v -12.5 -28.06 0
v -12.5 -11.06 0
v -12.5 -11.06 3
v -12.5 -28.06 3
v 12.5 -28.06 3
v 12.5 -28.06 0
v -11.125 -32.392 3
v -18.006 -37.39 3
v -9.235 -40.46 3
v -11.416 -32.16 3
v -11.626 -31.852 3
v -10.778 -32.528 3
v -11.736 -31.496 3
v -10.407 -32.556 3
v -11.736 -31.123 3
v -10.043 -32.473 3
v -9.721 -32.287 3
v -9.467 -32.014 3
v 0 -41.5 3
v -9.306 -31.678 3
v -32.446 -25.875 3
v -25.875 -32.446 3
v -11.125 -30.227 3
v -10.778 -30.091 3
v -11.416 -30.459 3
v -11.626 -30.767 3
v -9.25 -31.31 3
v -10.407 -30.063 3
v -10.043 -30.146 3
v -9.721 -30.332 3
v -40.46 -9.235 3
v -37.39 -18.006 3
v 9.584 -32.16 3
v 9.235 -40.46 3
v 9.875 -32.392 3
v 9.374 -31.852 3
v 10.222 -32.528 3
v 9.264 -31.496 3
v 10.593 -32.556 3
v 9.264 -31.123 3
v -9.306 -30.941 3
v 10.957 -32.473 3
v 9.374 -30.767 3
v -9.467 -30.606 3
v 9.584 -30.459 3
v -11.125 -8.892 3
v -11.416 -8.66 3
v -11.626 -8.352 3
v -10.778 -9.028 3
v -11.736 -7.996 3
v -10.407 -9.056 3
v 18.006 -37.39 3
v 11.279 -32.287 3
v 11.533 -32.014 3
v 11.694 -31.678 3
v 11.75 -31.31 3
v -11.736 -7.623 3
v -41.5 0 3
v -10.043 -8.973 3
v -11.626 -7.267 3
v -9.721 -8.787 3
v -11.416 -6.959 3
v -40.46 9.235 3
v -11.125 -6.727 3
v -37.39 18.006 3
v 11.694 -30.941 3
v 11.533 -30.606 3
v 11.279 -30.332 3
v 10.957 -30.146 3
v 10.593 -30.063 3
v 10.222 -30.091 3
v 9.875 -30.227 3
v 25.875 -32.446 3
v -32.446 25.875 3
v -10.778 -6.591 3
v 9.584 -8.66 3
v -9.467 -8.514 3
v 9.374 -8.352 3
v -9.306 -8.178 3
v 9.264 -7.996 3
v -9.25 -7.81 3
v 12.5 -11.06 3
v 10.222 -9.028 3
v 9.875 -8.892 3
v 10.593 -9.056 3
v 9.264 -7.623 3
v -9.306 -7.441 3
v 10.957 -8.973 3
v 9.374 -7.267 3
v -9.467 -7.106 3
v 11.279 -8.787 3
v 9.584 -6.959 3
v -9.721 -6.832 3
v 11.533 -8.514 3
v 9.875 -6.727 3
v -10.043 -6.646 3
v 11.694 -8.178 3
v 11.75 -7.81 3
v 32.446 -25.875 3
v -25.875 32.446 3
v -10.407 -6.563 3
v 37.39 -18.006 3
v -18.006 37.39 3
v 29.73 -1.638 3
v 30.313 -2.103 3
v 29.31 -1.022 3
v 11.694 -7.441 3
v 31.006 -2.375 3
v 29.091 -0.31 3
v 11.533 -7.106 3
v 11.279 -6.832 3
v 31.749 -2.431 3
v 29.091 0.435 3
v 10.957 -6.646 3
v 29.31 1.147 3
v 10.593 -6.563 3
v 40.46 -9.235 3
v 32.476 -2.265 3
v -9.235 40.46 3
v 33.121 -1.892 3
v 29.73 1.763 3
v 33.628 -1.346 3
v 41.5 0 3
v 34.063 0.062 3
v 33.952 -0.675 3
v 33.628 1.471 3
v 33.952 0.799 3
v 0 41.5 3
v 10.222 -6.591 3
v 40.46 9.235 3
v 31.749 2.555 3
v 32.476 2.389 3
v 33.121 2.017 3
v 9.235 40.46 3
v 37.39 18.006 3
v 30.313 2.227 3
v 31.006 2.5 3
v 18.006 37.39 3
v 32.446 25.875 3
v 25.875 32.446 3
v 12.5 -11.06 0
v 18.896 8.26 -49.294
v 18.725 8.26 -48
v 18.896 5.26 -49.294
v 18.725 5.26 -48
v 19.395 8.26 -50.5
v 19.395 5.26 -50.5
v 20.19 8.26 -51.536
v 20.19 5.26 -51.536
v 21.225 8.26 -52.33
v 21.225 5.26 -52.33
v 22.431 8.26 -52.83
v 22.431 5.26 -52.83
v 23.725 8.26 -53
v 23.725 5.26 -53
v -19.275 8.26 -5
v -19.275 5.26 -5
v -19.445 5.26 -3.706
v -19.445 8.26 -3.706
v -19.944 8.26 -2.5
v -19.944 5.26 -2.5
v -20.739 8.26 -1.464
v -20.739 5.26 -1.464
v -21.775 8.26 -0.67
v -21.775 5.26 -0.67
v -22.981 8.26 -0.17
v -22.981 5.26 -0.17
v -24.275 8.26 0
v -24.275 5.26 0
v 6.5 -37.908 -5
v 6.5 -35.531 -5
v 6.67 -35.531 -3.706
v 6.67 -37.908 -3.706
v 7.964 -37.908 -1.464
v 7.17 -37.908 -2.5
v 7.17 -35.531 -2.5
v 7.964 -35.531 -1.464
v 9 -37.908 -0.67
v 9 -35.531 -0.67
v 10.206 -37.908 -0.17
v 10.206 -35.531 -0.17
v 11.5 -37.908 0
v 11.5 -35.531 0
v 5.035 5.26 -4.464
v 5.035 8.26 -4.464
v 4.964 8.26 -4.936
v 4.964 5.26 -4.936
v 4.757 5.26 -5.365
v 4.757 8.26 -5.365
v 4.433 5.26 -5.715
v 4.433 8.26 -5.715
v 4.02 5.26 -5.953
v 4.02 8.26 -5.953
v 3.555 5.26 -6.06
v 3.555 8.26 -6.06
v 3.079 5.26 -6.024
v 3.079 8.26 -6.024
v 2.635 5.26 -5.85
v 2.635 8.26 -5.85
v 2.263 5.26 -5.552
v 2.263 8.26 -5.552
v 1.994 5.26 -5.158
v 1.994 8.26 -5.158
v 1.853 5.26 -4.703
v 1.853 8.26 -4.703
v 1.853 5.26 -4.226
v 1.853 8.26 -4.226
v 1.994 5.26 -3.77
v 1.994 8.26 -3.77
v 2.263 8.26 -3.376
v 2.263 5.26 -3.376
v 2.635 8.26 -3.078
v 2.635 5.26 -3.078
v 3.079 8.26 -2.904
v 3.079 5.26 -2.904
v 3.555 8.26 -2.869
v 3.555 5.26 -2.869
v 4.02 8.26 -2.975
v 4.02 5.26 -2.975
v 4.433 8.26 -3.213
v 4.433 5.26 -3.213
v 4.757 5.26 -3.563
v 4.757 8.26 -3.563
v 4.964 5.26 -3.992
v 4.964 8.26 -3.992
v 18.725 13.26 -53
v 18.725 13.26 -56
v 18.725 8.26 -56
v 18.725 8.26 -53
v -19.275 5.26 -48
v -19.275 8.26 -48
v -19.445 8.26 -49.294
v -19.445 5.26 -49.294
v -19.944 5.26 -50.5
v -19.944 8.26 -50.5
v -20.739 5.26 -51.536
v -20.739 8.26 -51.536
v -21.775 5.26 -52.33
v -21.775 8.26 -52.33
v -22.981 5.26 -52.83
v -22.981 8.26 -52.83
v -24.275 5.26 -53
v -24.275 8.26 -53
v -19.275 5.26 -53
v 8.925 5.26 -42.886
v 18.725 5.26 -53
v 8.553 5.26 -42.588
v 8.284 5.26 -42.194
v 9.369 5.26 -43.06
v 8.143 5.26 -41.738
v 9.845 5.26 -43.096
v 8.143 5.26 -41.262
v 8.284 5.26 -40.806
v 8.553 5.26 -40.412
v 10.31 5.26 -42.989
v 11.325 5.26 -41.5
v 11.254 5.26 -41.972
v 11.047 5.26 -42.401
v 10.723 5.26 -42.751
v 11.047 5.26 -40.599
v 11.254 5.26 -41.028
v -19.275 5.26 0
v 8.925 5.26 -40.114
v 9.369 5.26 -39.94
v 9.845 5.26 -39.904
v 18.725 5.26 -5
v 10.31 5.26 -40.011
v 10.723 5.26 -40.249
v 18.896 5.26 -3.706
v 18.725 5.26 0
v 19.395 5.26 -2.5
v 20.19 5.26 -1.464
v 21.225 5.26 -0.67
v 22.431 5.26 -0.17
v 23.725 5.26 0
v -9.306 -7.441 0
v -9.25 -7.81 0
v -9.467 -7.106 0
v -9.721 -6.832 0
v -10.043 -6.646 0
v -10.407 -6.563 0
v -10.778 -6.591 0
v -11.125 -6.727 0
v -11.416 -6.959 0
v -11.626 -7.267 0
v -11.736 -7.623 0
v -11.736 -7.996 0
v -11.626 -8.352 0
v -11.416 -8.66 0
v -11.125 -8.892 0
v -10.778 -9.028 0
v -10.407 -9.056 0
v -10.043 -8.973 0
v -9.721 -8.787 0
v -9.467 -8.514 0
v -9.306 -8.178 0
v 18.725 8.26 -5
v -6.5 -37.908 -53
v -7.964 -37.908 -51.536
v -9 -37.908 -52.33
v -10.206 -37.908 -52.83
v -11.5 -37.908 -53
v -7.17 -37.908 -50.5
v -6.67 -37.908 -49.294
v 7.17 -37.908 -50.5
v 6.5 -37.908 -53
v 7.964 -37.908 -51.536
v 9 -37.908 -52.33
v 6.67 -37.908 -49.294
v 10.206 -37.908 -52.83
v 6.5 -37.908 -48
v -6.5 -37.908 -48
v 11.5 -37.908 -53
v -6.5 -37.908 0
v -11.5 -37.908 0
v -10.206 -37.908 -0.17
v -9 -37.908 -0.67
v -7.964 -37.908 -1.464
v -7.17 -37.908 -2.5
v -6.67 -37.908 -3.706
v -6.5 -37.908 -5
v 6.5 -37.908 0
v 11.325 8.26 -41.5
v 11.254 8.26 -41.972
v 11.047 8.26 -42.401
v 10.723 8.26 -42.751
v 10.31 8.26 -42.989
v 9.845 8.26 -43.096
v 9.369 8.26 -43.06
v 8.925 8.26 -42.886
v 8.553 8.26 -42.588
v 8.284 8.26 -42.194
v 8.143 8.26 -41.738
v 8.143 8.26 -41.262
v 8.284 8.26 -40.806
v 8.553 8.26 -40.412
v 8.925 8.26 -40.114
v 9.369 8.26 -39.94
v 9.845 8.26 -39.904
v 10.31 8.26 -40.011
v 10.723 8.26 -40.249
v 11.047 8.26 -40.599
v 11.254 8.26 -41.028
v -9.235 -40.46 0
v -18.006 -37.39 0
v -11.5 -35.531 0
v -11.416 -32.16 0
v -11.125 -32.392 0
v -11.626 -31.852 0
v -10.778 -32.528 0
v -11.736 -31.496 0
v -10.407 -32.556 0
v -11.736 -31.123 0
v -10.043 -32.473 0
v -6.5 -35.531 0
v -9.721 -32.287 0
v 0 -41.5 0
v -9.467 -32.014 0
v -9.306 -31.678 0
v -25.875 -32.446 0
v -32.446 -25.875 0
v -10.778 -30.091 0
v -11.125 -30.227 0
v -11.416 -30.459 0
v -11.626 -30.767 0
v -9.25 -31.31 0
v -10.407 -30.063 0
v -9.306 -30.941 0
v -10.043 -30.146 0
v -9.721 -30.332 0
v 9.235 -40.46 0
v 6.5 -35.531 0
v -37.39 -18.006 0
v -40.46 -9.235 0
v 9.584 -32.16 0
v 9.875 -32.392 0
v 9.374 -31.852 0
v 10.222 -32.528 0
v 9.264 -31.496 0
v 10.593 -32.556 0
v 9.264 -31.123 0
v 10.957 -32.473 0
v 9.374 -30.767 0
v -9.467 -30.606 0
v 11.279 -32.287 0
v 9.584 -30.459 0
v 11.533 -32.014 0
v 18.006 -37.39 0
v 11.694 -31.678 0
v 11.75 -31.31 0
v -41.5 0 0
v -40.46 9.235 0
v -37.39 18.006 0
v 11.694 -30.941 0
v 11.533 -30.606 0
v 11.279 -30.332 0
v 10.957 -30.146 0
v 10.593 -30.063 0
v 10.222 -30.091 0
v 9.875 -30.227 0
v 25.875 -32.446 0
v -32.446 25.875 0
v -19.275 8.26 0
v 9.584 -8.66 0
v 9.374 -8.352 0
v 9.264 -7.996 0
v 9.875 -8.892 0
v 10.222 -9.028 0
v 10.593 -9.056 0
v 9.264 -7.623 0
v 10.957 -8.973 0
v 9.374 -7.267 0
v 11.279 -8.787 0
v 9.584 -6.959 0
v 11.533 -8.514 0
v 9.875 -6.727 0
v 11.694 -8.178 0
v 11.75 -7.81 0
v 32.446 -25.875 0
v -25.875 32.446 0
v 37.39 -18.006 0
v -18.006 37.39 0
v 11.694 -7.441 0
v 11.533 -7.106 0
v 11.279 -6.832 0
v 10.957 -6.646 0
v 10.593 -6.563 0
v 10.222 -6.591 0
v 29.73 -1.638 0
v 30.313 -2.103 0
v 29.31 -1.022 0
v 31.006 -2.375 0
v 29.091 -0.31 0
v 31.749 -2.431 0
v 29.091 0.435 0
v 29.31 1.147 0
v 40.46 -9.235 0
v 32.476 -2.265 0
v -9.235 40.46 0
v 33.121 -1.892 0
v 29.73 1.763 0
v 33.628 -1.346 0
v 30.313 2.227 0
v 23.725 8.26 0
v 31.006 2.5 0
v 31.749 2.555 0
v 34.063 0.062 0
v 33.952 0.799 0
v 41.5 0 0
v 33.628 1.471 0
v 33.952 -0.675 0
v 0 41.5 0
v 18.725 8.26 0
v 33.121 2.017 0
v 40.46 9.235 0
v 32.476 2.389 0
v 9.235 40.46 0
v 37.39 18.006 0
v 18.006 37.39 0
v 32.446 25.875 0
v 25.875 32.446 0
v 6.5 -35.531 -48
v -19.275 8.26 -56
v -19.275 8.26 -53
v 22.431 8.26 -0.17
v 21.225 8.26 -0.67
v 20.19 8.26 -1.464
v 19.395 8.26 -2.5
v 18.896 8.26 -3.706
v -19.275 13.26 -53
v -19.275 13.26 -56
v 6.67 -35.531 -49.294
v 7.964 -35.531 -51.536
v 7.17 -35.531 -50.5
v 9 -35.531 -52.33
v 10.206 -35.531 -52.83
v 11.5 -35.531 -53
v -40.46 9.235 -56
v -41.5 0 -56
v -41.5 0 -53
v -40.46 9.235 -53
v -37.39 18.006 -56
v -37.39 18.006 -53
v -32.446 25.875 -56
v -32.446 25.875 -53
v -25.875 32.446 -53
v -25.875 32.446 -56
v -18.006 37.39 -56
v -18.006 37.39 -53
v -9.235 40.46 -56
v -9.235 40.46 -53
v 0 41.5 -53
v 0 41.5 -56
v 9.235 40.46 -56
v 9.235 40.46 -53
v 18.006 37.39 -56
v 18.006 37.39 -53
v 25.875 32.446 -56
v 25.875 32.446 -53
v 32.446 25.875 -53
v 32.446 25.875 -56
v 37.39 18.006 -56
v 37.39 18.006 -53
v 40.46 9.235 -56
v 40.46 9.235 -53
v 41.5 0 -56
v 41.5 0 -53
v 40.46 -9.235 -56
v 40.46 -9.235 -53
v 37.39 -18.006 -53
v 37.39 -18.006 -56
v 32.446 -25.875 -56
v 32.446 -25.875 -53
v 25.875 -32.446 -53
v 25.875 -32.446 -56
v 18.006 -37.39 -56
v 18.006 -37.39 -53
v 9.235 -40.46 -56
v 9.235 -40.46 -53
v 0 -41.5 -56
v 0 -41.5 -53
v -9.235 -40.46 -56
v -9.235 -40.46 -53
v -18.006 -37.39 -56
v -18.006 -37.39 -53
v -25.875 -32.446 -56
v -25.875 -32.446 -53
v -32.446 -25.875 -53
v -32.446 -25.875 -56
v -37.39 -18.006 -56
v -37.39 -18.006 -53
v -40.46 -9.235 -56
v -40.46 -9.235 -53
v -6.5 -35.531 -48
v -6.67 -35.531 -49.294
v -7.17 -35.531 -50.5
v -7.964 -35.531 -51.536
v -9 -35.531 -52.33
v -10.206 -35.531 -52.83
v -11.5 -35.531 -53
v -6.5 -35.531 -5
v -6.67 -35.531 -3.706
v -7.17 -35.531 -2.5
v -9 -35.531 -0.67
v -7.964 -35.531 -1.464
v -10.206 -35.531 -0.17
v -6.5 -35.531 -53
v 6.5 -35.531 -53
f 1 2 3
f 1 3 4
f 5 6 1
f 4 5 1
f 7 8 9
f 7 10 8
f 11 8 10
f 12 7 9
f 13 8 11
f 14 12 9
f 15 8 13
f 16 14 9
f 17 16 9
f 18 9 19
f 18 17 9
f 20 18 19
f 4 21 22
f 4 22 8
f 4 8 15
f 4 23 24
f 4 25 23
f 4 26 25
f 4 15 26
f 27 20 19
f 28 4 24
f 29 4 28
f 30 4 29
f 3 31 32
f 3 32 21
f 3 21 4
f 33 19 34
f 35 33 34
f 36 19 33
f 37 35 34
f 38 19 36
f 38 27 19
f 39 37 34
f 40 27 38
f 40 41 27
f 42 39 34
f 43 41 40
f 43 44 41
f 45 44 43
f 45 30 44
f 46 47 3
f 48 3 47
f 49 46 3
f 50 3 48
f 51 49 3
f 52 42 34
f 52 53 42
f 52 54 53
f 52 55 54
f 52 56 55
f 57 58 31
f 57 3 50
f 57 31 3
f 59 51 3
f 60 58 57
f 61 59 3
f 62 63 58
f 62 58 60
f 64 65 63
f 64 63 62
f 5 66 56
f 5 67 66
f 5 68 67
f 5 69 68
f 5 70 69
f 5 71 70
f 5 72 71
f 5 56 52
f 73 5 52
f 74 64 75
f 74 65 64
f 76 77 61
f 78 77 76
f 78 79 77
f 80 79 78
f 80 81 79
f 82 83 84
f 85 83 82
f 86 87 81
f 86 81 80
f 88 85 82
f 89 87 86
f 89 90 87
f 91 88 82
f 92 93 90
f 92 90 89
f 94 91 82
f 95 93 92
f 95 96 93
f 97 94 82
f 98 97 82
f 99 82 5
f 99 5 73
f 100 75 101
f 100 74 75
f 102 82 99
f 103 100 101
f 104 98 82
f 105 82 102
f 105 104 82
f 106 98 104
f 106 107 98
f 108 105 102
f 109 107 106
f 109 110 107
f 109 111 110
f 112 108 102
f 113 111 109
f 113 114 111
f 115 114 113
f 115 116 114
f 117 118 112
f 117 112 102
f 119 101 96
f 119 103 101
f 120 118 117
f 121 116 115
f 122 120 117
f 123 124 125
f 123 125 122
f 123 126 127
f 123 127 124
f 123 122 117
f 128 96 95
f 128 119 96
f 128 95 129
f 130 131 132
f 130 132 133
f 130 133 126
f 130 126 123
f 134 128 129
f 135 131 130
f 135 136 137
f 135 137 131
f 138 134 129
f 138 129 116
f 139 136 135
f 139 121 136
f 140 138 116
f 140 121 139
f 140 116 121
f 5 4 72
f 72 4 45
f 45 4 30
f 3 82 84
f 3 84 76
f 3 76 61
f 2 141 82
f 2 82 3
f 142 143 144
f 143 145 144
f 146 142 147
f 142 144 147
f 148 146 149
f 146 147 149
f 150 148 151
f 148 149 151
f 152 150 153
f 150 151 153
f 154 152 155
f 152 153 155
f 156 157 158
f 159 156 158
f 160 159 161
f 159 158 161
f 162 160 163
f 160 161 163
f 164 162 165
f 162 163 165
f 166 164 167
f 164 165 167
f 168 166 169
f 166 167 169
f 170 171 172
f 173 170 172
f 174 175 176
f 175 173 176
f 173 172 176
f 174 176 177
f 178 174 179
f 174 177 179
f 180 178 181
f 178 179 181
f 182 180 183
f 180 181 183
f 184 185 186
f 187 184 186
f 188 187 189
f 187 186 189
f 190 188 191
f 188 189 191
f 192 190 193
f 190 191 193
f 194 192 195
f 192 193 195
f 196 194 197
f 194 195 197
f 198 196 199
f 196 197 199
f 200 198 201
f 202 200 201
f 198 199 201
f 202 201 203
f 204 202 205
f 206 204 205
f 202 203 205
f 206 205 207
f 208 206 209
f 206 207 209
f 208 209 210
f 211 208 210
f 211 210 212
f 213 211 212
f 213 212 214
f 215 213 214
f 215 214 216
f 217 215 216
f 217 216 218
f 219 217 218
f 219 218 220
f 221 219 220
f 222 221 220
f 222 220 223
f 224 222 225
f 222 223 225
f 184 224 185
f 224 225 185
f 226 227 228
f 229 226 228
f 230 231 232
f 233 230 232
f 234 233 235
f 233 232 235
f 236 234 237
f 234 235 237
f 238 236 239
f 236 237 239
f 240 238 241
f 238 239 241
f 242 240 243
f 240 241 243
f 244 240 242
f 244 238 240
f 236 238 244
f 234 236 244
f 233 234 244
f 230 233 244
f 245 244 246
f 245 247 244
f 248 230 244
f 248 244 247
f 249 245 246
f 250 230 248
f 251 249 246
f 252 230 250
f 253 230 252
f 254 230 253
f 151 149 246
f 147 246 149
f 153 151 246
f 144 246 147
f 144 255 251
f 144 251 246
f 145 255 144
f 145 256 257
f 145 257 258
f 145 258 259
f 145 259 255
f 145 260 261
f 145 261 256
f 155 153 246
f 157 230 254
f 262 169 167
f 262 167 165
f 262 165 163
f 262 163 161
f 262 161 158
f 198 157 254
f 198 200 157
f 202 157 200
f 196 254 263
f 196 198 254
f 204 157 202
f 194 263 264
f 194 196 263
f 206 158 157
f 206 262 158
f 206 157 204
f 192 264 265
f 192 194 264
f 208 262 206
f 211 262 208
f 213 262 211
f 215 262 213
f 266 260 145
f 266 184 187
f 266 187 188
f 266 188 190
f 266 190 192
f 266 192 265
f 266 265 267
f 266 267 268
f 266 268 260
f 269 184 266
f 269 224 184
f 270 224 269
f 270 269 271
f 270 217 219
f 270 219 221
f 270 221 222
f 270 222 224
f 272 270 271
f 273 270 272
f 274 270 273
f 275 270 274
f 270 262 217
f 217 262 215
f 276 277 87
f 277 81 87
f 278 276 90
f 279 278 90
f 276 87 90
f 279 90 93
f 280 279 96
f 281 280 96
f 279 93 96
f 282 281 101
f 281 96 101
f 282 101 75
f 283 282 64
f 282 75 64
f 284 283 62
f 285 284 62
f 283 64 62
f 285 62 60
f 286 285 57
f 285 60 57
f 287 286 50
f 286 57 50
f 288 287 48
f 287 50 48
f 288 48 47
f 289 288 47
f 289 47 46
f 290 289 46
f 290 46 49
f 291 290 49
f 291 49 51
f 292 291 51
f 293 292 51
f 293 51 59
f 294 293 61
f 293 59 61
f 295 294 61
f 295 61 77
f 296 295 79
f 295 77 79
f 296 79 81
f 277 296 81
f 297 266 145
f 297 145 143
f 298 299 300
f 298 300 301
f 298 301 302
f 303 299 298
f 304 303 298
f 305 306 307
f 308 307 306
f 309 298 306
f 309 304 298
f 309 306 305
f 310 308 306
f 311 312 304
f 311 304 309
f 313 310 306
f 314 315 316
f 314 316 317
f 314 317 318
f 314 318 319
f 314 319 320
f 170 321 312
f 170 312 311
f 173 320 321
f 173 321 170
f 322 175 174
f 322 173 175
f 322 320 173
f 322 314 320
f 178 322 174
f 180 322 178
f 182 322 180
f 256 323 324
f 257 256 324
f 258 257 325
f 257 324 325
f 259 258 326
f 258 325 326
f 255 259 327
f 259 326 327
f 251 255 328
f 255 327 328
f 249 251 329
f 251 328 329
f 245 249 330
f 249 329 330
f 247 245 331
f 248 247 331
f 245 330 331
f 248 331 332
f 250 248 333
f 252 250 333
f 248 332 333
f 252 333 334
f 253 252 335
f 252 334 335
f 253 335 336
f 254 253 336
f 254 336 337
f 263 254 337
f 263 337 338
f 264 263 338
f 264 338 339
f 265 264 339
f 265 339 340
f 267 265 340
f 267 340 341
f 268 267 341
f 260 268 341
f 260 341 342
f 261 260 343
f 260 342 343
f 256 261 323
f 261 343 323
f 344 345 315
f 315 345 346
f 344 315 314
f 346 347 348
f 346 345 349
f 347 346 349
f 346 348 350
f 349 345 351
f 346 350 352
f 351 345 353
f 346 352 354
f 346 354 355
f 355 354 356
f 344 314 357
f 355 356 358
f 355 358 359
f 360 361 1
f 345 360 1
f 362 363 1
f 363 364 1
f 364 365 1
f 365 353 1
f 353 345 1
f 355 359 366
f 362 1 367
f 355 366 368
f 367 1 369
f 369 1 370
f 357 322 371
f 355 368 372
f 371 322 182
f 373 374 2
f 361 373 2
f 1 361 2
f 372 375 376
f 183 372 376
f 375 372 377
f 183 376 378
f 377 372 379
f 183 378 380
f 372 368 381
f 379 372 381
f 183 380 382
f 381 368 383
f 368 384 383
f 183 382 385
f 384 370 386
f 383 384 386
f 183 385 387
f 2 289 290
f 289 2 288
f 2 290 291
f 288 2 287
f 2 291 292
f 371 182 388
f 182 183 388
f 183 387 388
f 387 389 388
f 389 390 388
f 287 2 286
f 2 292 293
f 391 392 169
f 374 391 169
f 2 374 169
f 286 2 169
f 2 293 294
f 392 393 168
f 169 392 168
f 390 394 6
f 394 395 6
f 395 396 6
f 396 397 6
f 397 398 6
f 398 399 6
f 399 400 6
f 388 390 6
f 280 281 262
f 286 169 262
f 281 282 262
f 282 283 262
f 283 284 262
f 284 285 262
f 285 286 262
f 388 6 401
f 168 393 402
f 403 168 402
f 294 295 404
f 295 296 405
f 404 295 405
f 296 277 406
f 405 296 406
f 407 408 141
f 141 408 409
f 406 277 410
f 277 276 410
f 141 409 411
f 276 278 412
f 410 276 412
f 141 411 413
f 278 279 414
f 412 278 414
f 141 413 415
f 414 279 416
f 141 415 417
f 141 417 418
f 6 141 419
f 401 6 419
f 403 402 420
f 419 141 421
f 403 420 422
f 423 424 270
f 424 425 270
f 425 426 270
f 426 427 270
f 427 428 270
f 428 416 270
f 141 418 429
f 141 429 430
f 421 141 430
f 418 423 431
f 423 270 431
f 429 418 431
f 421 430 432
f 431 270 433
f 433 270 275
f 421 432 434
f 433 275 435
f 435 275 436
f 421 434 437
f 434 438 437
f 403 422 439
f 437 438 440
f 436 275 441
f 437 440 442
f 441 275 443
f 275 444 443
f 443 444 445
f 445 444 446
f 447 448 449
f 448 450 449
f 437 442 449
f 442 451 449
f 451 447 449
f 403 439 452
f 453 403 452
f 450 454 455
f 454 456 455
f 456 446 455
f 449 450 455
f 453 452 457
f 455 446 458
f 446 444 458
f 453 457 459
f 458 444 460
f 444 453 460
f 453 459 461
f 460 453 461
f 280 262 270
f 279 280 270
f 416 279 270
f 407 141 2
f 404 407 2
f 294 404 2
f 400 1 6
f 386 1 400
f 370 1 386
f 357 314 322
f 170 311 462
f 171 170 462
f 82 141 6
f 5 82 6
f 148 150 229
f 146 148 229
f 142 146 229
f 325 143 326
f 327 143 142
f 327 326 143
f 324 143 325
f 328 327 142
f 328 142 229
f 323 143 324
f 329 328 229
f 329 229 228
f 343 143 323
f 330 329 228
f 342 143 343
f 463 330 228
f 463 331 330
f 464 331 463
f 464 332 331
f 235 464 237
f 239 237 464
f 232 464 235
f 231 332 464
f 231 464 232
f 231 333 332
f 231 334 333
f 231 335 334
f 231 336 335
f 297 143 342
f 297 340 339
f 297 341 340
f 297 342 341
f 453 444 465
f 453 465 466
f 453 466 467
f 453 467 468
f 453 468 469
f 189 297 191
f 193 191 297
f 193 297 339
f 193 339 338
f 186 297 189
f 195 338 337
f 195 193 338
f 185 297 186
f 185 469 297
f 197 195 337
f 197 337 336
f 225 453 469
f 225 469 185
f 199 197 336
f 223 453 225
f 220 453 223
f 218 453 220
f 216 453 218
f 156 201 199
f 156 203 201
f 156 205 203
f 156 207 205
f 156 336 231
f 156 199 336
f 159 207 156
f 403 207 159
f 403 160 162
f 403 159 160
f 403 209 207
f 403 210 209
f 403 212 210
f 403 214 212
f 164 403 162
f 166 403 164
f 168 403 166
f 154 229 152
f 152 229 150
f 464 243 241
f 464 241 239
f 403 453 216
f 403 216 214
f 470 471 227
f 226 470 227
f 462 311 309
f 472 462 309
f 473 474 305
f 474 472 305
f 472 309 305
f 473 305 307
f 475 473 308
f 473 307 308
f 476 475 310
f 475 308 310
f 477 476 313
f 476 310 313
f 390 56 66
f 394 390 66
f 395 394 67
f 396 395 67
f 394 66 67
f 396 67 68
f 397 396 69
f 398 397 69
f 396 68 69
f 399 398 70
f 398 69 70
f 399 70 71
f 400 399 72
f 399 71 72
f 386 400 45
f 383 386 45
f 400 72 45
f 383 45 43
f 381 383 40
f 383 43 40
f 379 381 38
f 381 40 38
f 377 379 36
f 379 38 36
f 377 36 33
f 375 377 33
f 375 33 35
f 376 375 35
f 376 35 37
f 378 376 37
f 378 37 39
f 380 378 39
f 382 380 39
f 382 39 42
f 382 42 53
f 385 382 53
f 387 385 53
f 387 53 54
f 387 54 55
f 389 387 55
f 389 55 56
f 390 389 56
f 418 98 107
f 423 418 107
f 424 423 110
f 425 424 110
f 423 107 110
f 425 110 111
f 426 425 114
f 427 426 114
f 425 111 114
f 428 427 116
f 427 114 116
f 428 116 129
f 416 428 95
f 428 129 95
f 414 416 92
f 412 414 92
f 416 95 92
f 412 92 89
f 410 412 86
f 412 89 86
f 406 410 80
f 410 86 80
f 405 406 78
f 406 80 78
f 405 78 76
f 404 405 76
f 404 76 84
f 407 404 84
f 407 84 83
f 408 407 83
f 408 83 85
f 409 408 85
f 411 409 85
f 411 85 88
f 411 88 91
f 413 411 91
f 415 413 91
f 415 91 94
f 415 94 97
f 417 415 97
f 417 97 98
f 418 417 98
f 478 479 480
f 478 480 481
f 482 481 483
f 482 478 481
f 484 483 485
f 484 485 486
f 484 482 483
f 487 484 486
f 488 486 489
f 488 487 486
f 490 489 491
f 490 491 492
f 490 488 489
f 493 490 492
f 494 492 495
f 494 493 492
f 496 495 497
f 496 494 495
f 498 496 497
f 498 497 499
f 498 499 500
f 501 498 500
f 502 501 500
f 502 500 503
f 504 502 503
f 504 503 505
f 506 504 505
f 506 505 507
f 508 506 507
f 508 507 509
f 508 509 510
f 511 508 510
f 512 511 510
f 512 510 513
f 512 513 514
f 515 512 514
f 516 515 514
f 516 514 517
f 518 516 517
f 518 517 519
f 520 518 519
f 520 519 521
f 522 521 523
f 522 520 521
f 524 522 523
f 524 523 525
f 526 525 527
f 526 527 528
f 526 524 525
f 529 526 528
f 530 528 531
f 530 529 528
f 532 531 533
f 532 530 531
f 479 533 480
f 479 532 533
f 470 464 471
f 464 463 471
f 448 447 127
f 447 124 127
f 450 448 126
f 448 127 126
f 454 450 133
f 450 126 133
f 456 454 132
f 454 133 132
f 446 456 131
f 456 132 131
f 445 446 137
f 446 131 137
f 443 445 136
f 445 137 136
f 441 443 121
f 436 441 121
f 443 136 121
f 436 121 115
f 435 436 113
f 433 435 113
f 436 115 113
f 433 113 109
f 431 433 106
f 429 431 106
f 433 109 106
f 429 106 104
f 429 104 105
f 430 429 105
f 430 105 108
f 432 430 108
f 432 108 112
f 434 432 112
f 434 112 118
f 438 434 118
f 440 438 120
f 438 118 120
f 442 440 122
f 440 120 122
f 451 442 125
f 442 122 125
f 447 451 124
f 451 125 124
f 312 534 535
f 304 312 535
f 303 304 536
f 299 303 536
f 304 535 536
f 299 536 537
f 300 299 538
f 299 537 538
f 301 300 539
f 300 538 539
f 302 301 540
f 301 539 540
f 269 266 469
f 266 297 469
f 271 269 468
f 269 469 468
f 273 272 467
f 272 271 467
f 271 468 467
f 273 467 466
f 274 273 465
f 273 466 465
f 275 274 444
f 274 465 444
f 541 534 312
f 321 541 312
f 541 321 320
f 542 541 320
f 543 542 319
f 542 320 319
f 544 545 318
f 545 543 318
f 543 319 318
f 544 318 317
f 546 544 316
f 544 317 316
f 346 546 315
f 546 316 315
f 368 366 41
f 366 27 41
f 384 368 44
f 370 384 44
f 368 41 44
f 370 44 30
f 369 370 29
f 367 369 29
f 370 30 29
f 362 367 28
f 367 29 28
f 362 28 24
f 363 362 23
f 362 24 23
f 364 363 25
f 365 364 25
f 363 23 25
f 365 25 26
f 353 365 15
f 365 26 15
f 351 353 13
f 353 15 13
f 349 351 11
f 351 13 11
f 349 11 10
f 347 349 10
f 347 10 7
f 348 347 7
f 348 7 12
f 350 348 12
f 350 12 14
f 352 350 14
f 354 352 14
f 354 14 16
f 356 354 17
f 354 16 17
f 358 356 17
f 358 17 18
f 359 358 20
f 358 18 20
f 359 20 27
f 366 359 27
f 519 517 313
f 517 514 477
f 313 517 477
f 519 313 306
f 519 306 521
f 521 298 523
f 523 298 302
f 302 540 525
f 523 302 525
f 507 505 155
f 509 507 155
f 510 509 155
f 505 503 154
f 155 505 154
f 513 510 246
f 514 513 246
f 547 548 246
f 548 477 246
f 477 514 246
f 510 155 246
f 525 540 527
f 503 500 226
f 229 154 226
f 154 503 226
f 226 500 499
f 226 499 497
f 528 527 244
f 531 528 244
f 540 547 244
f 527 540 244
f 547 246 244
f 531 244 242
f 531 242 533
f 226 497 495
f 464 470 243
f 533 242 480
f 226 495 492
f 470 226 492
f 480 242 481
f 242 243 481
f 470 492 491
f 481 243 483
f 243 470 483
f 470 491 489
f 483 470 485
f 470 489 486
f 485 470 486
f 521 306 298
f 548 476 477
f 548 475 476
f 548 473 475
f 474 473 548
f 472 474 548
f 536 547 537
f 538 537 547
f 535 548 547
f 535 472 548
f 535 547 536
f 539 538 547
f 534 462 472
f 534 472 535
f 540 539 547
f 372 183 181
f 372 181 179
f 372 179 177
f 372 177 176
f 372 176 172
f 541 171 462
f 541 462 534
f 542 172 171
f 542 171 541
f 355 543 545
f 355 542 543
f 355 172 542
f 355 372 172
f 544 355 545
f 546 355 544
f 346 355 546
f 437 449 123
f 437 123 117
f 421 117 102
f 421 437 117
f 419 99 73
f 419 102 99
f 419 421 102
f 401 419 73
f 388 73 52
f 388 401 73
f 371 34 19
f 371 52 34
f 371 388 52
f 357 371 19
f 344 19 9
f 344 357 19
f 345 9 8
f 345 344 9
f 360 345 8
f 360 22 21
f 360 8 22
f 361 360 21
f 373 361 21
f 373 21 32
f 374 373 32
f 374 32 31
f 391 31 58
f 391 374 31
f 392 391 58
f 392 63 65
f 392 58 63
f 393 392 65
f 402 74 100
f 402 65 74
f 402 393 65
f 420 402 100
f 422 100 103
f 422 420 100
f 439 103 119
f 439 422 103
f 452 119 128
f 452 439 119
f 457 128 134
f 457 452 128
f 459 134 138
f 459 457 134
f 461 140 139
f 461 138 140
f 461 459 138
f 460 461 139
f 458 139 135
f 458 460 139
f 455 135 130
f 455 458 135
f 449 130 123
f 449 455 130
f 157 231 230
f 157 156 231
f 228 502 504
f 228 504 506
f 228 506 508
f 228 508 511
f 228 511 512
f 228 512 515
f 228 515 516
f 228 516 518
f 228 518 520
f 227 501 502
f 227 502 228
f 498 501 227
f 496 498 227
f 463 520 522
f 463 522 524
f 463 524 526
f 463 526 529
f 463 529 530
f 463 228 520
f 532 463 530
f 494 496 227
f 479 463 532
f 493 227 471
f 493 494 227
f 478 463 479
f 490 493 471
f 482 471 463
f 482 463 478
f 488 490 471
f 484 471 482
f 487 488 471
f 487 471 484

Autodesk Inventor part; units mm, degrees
ref_plane "YZ Plane" through (0, 0, 0) normal (1, 0, 0) x (0, 1, 0)
ref_plane "XZ Plane" through (0, 0, 0) normal (0, 1, 0) x (-1, 0, 0)
ref_plane "XY Plane" through (0, 0, 0) normal (0, 0, 1) x (1, 0, 0)
sketch "Эскиз3" plane through (0, 0, 0) normal (0, 0, 1) x (1, 0, 0)
  circle A0 centre (0, 0) radius 41.5
  line L0 (12.5, -11.0597) -> (-12.5, -11.0597) projected
  line L1 (-12.5, -11.0597) -> (-12.5, -28.0597) projected
  line L2 (-12.5, -11.0597) -> (12.5, -11.0597)
  line L3 (12.5, -11.0597) -> (12.5, -28.0597)
  line L4 (12.5, -28.0597) -> (-12.5, -28.0597)
  line L5 (-12.5, -28.0597) -> (-12.5, -11.0597)
  dimension "d9" = 83
  dimension "d10" = 25
  dimension "d11" = 17
  dimension "d13" = 25
  dimension "d14" = 17
  dimension "d15" = 12.5
extrude "Выдавливание3" add sketch "Эскиз3" along normal blind 3
sketch "Эскиз4" plane through (0, 0, 3) normal (0, 0, 1) x (1, 0, 0)
  arc A0 (5.7629, -8.6636) -> (-4.709, -8.7124) centre (0.4132, 15.7598) ccw
  circle A1 centre (0.4132, 15.7598) radius 1.5338
  point P0 (0, 0)
extrude "Выдавливание4" cut sketch "Эскиз4" against normal blind 3
sketch "Эскиз5" plane through (0, 0, 3) normal (0, 0, 1) x (1, 0, 0)
  line L0 (28.2027, -2.4247) -> (31.5626, 4.2424) projected
  circle A0 centre (31.5626, 0.0623) radius 2.5
  point P0 (0, 0)
  dimension "d20" = 5
extrude "Выдавливание5" cut sketch "Эскиз5" against normal blind 3
sketch "Эскиз6" plane through (0, 0, 3) normal (0, 0, 1) x (1, 0, 0)
  circle A0 centre (0.4132, 15.7598) radius 1.5338 projected
  point P0 (0, 0)
extrude "Выдавливание6" add sketch "Эскиз6" against normal blind 3
sketch "Эскиз7" plane through (0, 0, 3) normal (0, 0, 1) x (1, 0, 0)
  circle A0 centre (10.5, -7.8097) radius 1.25 projected
  circle A1 centre (-10.5, -7.8097) radius 1.25 projected
  circle A2 centre (-10.5, -31.3097) radius 1.25 projected
  circle A3 centre (10.5, -31.3097) radius 1.25 projected
  point P0 (0, 0)
extrude "Выдавливание7" cut sketch "Эскиз7" against normal blind 3
sketch "Эскиз8" plane through (0, 0, 0) normal (0, 0, -1) x (-1, 0, 0)
  line L0 (-18.7254, 8.2596) -> (19.2746, 8.2596) projected
  line L1 (-18.7254, 8.2596) -> (19.2746, 8.2596)
  line L2 (19.2746, 8.2596) -> (19.2746, 5.2596)
  line L3 (19.2746, 5.2596) -> (-18.7254, 5.2596)
  line L4 (-18.7254, 5.2596) -> (-18.7254, 8.2596)
  point P0 (0, 0)
  dimension "d27" = 3
extrude "Выдавливание8" add sketch "Эскиз8" along normal blind 56
sketch "Эскиз9" plane through (-19.2746, 8.2596, 0) normal (0, 1, 0) x (1, 0, 0)
  circle A0 centre (29, 41.5) radius 1.6 projected
  circle A1 centre (22.71, 4.4641) radius 1.6 projected
  point P0 (19.2746, 0)
extrude "Выдавливание9" cut sketch "Эскиз9" against normal blind 56
sketch "Эскиз10" plane through (-19.2746, 5.2596, 0) normal (0, -1, 0) x (1, 0, 0)
  line L0 (0, 0) -> (38, 0) projected
  line L1 (38, 0) -> (38, -60) construction
  point P0 (19.2746, 0)
  dimension "d32" = 60
sketch "Эскиз11" plane through (0, 0, -56) normal (0, 0, -1) x (-1, 0, 0)
  circle A0 centre (0, 0) radius 41.5 projected
  line L0 (-18.7254, 5.2596) -> (19.2746, 5.2596) projected
  line L1 (19.2746, 5.2596) -> (19.2746, 8.2596) projected
  line L2 (19.2746, 8.2596) -> (-18.7254, 8.2596) projected
  line L3 (-18.7254, 8.2596) -> (-18.7254, 5.2596) projected
  line L4 (-18.7254, 5.2596) -> (-18.7254, 8.2596) projected
  line L5 (-18.7254, 8.2596) -> (19.2746, 8.2596)
  line L6 (19.2746, 8.2596) -> (19.2746, 13.2596)
  line L7 (19.2746, 13.2596) -> (-18.7254, 13.2596)
  line L8 (-18.7254, 13.2596) -> (-18.7254, 8.2596)
  dimension "d33" = 5
extrude "Выдавливание10" add sketch "Эскиз11" against normal blind 3
sketch "Эскиз12" plane through (0, 0, 0) normal (0, 0, -1) x (-1, 0, 0)
  circle A0 centre (0, 0) radius 41.5 projected
  line L0 (-6.5, -33.0597) -> (-6.5, -30.5597) projected
  line L1 (6.5, -33.0597) -> (6.5, -30.5597) projected
  line L2 (-6.5, -35.5314) -> (6.5, -35.5314)
  line L3 (6.5, -35.5314) -> (6.5, -37.9075)
  line L4 (6.5, -37.9075) -> (-6.5, -37.9075)
  line L5 (-6.5, -37.9075) -> (-6.5, -35.5314)
extrude "Выдавливание11" add sketch "Эскиз12" along normal blind 54.75 contours L2 L3 L4 L5
fillet "Сопряжение1" radius 5 8 edges at (-19.2746, 6.7596, 0) (18.7254, 6.7596, 0) (6.5, -36.7195, 0) (-6.5, -36.7195, 0) (-6.5, -36.7195, -53) (-19.2746, 6.7596, -53) (6.5, -36.7195, -53) (18.7254, 6.7596, -53)
equation "\"d13\" = d10"
equation "\"d14\" = d11"
equation "\"d15\" = 0.5 * d13"
properties part number "top2"
